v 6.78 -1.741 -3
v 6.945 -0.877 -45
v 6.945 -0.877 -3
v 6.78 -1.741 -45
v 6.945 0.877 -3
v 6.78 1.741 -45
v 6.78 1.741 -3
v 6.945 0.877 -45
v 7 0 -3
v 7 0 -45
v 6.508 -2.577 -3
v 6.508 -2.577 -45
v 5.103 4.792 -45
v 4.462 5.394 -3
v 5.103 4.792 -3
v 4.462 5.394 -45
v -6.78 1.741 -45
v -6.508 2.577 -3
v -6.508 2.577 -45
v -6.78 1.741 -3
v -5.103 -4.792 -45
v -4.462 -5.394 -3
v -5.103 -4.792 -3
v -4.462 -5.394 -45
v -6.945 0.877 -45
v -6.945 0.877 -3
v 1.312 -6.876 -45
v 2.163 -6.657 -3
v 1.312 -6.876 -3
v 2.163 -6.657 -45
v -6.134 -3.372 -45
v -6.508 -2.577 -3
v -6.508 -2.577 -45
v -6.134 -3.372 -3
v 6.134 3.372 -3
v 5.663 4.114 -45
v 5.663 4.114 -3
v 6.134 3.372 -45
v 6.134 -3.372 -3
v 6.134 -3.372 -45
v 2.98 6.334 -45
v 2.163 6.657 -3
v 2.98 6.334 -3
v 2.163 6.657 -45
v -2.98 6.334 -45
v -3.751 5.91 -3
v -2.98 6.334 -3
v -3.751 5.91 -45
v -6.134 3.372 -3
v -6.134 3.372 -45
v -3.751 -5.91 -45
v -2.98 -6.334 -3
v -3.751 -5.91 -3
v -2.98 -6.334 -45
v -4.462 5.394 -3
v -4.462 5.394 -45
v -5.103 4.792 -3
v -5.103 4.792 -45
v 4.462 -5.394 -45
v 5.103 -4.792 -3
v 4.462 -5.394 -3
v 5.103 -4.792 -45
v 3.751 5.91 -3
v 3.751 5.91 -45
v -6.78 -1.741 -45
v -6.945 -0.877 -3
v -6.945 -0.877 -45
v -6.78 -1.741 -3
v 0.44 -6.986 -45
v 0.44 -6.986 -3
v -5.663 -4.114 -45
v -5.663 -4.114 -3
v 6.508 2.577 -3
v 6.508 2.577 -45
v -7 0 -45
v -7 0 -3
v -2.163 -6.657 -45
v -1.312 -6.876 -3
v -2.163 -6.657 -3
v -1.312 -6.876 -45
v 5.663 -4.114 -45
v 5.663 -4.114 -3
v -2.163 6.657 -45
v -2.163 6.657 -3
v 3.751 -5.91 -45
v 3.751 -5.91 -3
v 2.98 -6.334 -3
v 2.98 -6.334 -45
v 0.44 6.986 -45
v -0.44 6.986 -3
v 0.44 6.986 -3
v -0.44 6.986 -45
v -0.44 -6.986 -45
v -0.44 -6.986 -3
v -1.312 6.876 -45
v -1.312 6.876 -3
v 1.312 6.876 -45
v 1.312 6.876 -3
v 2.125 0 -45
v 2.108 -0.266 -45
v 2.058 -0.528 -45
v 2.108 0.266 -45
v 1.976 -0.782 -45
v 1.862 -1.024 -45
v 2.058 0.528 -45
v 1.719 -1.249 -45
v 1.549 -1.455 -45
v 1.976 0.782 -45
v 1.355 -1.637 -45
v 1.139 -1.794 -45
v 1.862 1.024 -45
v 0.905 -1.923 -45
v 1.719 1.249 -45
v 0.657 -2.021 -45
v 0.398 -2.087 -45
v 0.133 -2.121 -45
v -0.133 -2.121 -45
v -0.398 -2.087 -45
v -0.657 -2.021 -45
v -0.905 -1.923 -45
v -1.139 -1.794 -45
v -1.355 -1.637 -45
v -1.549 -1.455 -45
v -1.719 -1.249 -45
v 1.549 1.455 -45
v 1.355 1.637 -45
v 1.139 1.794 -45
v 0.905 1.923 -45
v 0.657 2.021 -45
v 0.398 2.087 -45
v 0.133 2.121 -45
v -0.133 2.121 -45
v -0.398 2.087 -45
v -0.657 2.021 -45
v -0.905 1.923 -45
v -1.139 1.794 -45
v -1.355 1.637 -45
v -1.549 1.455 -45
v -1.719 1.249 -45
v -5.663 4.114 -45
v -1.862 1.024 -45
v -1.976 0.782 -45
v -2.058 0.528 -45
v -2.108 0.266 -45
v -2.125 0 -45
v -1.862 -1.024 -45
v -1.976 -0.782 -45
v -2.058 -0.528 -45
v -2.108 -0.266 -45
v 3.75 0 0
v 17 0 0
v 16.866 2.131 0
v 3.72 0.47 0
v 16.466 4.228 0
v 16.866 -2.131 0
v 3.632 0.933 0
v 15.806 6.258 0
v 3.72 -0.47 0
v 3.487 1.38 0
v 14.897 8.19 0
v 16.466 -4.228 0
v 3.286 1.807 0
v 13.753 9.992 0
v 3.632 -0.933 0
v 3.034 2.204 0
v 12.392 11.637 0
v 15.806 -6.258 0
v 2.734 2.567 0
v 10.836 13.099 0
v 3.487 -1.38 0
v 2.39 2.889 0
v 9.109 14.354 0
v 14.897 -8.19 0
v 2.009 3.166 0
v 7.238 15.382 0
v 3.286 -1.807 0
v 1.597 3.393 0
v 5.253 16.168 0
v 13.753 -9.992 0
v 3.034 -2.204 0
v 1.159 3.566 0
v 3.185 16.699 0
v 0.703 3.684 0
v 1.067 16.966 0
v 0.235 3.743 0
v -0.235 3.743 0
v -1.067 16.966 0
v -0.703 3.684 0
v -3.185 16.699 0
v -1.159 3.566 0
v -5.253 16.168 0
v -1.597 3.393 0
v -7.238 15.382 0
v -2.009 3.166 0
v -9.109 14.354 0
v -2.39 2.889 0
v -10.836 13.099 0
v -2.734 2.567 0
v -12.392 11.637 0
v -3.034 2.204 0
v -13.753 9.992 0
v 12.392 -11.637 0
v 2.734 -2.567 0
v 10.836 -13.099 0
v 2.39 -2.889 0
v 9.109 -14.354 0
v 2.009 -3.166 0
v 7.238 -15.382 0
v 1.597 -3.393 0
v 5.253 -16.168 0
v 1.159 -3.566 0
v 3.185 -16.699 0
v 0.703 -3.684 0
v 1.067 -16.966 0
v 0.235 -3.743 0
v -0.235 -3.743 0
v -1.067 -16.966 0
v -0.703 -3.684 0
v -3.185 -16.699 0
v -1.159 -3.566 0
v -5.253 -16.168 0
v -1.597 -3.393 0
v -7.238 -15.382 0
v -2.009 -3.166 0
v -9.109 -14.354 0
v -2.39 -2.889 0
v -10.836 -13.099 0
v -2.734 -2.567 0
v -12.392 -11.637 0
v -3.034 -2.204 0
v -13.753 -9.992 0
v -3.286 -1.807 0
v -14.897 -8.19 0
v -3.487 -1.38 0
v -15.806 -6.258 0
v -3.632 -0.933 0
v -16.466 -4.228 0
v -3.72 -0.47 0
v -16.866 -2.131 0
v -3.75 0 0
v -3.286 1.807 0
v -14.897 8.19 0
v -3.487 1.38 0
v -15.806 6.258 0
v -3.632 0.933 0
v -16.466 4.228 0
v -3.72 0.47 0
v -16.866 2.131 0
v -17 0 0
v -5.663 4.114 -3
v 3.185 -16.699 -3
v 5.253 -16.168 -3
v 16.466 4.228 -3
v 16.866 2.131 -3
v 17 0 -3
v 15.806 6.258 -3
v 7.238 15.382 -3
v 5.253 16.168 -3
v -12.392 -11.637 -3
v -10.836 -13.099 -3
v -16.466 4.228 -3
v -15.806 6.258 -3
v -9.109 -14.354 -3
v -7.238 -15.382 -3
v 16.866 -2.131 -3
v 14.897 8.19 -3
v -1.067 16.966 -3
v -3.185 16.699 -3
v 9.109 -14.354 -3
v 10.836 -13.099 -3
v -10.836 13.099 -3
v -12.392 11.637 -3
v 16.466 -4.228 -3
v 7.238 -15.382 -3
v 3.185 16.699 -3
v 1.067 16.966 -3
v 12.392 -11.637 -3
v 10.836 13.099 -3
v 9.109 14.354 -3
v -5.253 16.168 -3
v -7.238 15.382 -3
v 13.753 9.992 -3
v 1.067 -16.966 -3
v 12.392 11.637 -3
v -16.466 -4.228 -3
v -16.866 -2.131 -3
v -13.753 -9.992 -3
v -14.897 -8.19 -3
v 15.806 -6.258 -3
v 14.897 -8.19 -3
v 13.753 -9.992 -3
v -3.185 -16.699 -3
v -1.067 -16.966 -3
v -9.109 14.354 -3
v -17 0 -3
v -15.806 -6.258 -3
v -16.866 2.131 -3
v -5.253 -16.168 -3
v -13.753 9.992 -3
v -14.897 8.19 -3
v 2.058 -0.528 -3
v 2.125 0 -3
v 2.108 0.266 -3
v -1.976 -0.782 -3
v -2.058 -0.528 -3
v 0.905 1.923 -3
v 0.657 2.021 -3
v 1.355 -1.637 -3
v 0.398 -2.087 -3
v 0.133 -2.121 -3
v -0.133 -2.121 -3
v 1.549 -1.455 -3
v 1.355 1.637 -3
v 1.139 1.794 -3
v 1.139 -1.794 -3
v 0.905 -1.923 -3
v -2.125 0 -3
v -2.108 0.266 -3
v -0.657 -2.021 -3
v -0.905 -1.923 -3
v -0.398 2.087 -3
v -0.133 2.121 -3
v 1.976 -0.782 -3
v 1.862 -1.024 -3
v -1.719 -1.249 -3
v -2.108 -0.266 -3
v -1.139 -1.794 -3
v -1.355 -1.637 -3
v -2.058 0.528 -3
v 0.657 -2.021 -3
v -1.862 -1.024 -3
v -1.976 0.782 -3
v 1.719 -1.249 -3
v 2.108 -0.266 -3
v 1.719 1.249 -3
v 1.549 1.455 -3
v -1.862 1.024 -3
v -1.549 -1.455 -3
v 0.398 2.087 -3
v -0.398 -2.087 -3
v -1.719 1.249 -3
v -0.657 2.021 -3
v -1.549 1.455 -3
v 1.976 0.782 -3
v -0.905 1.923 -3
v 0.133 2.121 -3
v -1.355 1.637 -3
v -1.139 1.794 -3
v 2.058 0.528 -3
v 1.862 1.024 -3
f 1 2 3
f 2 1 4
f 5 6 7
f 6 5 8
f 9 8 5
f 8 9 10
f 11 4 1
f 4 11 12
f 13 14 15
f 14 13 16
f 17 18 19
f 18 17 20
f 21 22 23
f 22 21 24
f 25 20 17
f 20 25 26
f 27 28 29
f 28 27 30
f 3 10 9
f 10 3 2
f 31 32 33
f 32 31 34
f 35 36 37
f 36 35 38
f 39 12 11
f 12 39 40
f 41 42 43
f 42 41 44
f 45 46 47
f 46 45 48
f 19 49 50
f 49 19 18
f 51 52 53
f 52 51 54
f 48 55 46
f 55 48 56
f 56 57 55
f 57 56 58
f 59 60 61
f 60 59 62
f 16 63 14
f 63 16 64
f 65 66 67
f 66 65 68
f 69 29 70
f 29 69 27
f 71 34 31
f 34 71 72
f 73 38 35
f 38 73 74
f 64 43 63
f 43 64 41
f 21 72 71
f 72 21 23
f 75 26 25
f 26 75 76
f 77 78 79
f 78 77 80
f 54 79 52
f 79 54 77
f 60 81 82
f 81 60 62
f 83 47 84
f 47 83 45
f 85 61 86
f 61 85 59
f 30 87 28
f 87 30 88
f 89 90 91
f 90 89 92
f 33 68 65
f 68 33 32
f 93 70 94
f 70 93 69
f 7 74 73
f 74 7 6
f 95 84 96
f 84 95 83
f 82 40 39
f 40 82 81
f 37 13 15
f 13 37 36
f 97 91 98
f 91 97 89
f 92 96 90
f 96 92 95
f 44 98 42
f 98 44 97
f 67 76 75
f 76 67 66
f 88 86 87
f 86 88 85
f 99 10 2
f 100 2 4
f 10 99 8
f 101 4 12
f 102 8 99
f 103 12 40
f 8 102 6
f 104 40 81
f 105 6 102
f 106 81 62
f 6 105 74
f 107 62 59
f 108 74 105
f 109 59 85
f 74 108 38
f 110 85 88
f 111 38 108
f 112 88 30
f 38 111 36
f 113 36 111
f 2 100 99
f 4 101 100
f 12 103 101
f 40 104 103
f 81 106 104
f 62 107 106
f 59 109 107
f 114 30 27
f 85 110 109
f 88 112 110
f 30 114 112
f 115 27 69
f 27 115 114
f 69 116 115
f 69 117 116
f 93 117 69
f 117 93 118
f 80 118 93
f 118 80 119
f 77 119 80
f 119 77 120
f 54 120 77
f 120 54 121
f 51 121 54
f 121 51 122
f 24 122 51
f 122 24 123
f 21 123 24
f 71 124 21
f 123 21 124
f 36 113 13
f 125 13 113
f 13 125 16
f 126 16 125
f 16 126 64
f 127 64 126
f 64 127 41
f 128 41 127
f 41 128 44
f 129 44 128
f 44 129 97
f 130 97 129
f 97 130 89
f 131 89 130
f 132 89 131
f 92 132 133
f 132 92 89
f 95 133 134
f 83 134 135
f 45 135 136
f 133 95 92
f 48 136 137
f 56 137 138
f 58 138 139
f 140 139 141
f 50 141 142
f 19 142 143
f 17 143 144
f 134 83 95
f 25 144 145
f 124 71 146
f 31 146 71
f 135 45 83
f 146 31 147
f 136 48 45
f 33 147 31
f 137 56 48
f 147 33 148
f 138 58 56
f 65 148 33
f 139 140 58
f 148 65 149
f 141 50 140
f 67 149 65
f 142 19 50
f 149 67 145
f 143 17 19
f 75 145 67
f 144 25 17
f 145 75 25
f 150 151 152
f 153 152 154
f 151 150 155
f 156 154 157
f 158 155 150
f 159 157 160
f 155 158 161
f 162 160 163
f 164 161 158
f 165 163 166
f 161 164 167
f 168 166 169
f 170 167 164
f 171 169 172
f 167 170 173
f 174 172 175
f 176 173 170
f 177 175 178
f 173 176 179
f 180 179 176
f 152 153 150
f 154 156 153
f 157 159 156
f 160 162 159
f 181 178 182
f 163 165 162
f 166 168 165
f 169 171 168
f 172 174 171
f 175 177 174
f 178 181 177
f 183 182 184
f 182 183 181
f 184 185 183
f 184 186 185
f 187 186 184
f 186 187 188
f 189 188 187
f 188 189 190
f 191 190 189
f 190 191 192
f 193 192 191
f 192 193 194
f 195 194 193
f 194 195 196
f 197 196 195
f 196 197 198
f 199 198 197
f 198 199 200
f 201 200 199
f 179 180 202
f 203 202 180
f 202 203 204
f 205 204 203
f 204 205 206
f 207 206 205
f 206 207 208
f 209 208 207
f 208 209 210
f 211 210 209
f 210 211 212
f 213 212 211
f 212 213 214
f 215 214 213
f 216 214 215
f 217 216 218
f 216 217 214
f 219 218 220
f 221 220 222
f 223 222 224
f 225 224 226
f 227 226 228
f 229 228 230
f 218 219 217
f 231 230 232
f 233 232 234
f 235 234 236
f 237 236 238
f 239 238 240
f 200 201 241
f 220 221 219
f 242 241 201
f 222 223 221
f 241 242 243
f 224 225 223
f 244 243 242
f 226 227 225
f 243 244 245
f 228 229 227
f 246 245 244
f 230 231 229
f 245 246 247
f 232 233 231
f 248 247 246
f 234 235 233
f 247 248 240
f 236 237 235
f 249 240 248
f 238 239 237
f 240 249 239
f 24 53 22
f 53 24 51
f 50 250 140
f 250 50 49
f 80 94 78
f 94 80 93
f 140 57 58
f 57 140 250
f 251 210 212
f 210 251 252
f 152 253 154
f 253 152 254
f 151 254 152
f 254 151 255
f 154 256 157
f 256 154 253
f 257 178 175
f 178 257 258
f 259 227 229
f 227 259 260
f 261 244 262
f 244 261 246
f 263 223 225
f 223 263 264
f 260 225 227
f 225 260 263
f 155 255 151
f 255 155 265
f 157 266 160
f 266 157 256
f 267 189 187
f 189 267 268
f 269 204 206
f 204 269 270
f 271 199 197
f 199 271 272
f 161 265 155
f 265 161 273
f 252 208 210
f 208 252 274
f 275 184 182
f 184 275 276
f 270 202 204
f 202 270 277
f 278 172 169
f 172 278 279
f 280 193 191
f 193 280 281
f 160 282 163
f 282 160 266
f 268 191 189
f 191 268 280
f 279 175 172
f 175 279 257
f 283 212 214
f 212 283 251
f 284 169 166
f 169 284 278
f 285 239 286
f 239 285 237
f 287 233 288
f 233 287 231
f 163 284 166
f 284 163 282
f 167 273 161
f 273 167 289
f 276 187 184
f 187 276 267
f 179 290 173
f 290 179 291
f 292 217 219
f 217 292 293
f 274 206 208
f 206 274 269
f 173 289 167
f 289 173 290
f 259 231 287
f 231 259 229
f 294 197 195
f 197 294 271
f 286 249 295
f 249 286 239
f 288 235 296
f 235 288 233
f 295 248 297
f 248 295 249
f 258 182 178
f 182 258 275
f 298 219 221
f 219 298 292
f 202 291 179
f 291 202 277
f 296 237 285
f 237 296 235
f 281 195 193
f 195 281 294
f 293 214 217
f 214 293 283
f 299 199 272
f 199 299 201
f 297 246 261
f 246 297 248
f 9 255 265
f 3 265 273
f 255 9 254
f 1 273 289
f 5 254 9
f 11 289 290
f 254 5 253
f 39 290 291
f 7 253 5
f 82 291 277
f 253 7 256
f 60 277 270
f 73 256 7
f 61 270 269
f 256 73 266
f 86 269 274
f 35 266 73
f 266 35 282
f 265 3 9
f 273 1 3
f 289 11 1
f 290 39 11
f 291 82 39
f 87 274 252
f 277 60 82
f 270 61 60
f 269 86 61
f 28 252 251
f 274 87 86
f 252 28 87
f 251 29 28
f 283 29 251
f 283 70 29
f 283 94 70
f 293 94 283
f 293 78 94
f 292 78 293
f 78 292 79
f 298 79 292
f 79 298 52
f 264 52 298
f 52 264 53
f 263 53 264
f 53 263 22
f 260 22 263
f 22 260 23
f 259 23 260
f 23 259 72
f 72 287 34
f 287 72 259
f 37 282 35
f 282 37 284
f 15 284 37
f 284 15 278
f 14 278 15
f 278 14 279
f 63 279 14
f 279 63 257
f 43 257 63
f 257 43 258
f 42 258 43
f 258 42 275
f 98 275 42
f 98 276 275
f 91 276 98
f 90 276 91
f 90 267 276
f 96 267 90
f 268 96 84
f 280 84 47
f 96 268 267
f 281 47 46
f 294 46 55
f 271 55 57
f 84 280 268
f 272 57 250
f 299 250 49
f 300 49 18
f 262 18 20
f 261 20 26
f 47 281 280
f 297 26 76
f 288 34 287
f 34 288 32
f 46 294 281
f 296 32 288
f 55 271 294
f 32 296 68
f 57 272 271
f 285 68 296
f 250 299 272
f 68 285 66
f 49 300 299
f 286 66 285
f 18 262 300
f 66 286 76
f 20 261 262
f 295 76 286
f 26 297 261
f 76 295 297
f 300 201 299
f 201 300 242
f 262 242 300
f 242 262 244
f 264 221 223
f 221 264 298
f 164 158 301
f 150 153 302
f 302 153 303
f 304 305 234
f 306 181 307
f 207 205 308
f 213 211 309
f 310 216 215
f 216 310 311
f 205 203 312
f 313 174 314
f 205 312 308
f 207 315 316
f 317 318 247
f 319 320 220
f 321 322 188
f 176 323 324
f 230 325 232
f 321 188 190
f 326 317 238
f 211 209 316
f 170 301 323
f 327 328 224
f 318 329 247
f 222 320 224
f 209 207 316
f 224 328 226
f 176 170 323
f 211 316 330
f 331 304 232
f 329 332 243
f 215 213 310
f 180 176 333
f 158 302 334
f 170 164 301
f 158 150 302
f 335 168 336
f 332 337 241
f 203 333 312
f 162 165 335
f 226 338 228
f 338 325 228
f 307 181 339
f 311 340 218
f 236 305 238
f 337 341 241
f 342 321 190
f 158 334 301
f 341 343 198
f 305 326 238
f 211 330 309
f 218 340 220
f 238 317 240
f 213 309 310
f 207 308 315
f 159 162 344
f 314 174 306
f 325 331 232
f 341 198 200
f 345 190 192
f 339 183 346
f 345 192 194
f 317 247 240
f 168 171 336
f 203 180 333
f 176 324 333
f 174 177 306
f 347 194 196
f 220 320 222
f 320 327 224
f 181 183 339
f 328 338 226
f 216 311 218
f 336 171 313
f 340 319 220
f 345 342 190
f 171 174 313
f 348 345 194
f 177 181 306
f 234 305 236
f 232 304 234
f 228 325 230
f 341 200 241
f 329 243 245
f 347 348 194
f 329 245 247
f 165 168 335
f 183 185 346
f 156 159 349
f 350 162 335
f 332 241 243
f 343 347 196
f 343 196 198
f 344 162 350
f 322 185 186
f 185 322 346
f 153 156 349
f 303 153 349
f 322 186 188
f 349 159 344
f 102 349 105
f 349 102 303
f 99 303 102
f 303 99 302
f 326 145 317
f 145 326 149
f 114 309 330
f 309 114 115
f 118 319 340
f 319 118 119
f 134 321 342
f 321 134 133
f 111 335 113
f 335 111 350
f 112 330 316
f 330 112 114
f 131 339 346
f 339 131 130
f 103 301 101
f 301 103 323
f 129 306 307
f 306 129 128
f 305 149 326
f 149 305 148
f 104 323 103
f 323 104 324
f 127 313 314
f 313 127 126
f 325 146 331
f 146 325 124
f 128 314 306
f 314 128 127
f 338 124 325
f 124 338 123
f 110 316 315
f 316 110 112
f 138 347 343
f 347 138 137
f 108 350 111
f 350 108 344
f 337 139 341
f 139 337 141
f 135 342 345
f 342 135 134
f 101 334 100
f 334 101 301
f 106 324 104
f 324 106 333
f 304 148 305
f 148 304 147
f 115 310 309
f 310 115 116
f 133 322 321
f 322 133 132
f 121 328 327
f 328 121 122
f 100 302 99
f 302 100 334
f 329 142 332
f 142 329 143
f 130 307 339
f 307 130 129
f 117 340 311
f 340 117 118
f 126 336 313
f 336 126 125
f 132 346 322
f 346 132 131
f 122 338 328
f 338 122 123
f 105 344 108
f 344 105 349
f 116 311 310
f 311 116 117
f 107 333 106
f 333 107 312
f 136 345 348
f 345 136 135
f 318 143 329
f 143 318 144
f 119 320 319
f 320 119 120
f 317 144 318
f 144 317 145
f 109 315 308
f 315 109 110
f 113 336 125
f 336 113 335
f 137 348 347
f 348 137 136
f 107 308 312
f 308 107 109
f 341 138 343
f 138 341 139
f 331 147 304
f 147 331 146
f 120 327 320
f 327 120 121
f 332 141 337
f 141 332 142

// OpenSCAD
$fn = 50;


difference() {
	union() {
		translate(v = [0, 0, -45.0000000000]) {
			cylinder(h = 45, r = 7.0000000000);
		}
		translate(v = [0, 0, -3.0000000000]) {
			cylinder(h = 3, r = 17.0000000000);
		}
	}
	union() {
		translate(v = [0, 0, 0]) {
			rotate(a = [0, 0, 0]) {
				difference() {
					union() {
						#translate(v = [0, 0, -45.0000000000]) {
							cylinder(h = 45, r = 2.0000000000);
						}
						#translate(v = [0, 0, -3]) {
							cylinder(h = 3, r = 7.0000000000, r1 = 2.1250000000, r2 = 3.7500000000);
						}
						#translate(v = [0, 0, -45.0000000000]) {
							cylinder(h = 45, r = 2.1250000000);
						}
						#translate(v = [0, 0, -45.0000000000]) {
							cylinder(h = 45, r = 2.0000000000);
						}
					}
					union();
				}
			}
		}
	}
}
